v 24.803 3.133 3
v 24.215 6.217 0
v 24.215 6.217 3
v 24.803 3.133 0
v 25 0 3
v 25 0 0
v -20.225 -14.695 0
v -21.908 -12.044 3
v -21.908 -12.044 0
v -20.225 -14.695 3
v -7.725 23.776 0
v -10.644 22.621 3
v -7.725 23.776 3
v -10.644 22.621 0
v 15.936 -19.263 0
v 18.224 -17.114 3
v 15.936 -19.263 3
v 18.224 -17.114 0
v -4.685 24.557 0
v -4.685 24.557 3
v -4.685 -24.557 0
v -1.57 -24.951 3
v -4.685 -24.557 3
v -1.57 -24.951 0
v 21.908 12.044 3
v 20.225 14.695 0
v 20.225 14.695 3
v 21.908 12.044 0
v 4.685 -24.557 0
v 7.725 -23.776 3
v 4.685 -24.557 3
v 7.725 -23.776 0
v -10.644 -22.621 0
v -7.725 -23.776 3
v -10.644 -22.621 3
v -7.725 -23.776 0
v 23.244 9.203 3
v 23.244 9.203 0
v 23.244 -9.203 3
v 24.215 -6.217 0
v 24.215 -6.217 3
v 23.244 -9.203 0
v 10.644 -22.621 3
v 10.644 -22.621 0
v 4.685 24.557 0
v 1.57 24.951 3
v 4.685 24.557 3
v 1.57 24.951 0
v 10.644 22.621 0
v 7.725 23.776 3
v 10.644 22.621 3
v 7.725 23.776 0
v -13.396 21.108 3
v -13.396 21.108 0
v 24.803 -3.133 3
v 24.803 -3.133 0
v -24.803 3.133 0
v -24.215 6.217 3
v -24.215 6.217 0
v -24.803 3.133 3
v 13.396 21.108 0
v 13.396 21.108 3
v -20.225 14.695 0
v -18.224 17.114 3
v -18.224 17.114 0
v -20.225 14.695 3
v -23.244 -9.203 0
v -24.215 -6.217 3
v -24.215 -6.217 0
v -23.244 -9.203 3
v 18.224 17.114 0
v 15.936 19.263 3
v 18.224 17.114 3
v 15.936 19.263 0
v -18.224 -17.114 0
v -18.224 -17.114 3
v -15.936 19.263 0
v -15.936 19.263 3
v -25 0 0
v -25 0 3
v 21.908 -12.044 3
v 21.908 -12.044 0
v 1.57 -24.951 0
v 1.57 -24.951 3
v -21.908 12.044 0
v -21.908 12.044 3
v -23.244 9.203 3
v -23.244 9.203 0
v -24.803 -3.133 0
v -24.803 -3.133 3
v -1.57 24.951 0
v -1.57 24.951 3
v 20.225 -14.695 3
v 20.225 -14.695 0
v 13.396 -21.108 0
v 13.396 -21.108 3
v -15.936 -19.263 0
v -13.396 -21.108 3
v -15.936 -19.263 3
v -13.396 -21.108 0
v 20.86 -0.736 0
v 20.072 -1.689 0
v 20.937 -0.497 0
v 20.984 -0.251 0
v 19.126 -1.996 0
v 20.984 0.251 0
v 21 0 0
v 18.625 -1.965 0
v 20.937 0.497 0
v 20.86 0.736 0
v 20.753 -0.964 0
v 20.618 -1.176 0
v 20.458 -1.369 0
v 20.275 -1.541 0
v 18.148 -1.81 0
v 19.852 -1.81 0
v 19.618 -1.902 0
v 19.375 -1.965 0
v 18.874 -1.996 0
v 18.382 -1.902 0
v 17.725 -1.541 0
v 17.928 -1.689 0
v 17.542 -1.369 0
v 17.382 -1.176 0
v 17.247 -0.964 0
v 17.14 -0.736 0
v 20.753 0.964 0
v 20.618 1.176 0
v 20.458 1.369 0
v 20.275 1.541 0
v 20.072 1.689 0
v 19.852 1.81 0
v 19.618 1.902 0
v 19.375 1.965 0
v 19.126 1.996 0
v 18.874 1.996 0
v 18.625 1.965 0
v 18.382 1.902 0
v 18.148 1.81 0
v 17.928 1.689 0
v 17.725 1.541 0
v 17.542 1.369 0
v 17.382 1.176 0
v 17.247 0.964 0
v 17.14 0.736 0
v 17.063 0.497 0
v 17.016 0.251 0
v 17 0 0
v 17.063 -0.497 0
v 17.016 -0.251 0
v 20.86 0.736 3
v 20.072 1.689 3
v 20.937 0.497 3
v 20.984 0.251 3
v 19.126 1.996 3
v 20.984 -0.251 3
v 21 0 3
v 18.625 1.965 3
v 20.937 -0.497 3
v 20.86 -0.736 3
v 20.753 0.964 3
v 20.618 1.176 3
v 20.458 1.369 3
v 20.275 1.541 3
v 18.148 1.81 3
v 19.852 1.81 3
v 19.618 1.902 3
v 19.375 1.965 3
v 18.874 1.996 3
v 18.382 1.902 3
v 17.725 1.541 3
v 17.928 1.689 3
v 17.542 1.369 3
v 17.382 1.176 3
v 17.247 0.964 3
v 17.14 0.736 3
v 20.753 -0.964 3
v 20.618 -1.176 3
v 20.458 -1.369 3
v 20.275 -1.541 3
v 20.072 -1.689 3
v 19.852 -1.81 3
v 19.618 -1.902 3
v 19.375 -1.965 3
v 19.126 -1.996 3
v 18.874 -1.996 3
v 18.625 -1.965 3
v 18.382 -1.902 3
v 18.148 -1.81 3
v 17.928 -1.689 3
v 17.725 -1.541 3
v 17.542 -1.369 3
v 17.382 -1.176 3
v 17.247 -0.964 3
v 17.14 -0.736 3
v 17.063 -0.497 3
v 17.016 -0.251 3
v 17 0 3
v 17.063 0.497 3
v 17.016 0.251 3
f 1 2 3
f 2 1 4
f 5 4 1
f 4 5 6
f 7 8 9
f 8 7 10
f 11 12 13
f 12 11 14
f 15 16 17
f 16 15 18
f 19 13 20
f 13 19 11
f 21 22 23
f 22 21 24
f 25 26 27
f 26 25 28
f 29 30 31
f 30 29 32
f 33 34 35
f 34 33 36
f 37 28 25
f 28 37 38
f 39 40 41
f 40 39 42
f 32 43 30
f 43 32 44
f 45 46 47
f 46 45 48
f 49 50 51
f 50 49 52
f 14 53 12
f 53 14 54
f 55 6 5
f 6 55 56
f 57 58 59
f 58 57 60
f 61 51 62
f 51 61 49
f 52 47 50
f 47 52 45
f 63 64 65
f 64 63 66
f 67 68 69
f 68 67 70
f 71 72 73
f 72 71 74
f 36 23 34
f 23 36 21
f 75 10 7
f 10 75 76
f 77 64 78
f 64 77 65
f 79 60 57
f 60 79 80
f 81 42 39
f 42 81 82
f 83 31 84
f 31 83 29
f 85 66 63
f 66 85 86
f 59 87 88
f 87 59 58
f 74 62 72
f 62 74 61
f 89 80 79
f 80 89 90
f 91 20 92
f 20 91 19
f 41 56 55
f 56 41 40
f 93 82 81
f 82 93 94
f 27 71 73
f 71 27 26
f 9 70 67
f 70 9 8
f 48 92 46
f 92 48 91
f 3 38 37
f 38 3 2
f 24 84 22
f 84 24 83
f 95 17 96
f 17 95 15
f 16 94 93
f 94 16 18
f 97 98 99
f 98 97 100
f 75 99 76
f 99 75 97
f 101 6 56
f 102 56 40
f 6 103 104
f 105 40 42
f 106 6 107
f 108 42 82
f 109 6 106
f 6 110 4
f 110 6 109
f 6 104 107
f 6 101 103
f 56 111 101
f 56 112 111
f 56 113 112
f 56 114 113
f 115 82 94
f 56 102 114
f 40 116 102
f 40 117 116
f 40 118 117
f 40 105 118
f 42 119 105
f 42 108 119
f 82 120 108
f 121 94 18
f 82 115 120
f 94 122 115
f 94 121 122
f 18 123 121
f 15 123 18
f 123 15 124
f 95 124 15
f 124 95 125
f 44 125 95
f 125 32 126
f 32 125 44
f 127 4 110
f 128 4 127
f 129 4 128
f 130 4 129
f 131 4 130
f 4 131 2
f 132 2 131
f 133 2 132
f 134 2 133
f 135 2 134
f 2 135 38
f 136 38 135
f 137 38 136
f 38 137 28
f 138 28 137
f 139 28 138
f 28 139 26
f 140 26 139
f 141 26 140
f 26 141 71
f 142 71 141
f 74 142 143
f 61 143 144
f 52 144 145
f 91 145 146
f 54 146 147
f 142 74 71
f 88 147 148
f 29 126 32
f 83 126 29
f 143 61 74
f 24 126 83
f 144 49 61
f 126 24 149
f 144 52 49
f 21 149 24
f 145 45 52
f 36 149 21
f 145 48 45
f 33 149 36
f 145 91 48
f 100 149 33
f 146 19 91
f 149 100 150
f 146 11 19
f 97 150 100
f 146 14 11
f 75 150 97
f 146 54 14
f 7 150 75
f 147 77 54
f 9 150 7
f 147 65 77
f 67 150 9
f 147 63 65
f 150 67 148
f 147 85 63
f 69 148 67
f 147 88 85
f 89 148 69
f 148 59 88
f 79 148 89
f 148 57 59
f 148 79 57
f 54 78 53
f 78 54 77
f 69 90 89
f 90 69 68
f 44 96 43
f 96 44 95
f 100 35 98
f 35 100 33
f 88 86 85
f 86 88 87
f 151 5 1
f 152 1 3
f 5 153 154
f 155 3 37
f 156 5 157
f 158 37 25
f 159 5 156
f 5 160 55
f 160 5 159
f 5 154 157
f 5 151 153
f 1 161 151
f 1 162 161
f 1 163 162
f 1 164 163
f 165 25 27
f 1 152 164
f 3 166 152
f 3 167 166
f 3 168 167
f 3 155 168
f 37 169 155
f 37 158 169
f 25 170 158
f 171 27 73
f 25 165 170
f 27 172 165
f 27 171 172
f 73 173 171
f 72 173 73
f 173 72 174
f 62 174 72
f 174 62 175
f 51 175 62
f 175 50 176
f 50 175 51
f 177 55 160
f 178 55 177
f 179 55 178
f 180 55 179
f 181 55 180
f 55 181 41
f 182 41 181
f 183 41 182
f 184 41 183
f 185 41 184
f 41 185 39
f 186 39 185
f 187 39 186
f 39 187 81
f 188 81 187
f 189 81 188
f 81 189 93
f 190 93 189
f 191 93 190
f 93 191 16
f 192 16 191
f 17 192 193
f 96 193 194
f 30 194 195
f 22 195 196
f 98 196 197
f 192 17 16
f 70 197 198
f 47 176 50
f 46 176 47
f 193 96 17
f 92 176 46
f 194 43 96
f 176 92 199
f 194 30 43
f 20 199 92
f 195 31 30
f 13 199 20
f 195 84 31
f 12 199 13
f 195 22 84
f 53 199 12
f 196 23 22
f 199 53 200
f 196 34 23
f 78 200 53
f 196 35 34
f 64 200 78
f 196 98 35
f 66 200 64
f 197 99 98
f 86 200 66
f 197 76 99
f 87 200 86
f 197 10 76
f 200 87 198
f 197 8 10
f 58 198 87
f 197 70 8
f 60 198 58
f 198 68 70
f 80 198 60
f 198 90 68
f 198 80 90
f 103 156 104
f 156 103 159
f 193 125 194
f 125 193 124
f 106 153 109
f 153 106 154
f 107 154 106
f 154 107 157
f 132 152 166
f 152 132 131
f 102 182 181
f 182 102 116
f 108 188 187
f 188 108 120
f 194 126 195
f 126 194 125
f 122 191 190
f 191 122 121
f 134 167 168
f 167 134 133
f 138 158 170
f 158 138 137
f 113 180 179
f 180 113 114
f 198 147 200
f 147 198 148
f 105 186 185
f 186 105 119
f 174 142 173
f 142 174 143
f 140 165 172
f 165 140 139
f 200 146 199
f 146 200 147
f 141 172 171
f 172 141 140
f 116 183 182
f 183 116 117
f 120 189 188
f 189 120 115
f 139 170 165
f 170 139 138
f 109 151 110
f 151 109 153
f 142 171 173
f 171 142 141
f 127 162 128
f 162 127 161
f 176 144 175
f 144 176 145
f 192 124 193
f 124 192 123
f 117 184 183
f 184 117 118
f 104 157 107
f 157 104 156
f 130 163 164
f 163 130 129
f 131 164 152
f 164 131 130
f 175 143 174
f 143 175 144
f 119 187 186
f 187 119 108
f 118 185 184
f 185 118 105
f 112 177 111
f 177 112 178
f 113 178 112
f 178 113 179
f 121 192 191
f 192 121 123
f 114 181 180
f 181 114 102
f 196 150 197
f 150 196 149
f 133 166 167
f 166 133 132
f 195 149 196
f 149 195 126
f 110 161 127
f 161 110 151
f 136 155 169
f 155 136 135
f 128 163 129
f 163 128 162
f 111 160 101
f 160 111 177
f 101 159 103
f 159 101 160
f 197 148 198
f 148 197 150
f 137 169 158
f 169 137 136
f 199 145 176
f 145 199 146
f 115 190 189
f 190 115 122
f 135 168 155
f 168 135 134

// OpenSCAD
medallion_diameter = 50;
part_height = 3;
string_hole_diameter = 4;
wall_thickness = 2;
$fn = 50;

difference() {
    cylinder(d=medallion_diameter, h=part_height);
    translate([(medallion_diameter/2)-string_hole_diameter-wall_thickness,0,0]) cylinder(d=string_hole_diameter, h=part_height);
}
